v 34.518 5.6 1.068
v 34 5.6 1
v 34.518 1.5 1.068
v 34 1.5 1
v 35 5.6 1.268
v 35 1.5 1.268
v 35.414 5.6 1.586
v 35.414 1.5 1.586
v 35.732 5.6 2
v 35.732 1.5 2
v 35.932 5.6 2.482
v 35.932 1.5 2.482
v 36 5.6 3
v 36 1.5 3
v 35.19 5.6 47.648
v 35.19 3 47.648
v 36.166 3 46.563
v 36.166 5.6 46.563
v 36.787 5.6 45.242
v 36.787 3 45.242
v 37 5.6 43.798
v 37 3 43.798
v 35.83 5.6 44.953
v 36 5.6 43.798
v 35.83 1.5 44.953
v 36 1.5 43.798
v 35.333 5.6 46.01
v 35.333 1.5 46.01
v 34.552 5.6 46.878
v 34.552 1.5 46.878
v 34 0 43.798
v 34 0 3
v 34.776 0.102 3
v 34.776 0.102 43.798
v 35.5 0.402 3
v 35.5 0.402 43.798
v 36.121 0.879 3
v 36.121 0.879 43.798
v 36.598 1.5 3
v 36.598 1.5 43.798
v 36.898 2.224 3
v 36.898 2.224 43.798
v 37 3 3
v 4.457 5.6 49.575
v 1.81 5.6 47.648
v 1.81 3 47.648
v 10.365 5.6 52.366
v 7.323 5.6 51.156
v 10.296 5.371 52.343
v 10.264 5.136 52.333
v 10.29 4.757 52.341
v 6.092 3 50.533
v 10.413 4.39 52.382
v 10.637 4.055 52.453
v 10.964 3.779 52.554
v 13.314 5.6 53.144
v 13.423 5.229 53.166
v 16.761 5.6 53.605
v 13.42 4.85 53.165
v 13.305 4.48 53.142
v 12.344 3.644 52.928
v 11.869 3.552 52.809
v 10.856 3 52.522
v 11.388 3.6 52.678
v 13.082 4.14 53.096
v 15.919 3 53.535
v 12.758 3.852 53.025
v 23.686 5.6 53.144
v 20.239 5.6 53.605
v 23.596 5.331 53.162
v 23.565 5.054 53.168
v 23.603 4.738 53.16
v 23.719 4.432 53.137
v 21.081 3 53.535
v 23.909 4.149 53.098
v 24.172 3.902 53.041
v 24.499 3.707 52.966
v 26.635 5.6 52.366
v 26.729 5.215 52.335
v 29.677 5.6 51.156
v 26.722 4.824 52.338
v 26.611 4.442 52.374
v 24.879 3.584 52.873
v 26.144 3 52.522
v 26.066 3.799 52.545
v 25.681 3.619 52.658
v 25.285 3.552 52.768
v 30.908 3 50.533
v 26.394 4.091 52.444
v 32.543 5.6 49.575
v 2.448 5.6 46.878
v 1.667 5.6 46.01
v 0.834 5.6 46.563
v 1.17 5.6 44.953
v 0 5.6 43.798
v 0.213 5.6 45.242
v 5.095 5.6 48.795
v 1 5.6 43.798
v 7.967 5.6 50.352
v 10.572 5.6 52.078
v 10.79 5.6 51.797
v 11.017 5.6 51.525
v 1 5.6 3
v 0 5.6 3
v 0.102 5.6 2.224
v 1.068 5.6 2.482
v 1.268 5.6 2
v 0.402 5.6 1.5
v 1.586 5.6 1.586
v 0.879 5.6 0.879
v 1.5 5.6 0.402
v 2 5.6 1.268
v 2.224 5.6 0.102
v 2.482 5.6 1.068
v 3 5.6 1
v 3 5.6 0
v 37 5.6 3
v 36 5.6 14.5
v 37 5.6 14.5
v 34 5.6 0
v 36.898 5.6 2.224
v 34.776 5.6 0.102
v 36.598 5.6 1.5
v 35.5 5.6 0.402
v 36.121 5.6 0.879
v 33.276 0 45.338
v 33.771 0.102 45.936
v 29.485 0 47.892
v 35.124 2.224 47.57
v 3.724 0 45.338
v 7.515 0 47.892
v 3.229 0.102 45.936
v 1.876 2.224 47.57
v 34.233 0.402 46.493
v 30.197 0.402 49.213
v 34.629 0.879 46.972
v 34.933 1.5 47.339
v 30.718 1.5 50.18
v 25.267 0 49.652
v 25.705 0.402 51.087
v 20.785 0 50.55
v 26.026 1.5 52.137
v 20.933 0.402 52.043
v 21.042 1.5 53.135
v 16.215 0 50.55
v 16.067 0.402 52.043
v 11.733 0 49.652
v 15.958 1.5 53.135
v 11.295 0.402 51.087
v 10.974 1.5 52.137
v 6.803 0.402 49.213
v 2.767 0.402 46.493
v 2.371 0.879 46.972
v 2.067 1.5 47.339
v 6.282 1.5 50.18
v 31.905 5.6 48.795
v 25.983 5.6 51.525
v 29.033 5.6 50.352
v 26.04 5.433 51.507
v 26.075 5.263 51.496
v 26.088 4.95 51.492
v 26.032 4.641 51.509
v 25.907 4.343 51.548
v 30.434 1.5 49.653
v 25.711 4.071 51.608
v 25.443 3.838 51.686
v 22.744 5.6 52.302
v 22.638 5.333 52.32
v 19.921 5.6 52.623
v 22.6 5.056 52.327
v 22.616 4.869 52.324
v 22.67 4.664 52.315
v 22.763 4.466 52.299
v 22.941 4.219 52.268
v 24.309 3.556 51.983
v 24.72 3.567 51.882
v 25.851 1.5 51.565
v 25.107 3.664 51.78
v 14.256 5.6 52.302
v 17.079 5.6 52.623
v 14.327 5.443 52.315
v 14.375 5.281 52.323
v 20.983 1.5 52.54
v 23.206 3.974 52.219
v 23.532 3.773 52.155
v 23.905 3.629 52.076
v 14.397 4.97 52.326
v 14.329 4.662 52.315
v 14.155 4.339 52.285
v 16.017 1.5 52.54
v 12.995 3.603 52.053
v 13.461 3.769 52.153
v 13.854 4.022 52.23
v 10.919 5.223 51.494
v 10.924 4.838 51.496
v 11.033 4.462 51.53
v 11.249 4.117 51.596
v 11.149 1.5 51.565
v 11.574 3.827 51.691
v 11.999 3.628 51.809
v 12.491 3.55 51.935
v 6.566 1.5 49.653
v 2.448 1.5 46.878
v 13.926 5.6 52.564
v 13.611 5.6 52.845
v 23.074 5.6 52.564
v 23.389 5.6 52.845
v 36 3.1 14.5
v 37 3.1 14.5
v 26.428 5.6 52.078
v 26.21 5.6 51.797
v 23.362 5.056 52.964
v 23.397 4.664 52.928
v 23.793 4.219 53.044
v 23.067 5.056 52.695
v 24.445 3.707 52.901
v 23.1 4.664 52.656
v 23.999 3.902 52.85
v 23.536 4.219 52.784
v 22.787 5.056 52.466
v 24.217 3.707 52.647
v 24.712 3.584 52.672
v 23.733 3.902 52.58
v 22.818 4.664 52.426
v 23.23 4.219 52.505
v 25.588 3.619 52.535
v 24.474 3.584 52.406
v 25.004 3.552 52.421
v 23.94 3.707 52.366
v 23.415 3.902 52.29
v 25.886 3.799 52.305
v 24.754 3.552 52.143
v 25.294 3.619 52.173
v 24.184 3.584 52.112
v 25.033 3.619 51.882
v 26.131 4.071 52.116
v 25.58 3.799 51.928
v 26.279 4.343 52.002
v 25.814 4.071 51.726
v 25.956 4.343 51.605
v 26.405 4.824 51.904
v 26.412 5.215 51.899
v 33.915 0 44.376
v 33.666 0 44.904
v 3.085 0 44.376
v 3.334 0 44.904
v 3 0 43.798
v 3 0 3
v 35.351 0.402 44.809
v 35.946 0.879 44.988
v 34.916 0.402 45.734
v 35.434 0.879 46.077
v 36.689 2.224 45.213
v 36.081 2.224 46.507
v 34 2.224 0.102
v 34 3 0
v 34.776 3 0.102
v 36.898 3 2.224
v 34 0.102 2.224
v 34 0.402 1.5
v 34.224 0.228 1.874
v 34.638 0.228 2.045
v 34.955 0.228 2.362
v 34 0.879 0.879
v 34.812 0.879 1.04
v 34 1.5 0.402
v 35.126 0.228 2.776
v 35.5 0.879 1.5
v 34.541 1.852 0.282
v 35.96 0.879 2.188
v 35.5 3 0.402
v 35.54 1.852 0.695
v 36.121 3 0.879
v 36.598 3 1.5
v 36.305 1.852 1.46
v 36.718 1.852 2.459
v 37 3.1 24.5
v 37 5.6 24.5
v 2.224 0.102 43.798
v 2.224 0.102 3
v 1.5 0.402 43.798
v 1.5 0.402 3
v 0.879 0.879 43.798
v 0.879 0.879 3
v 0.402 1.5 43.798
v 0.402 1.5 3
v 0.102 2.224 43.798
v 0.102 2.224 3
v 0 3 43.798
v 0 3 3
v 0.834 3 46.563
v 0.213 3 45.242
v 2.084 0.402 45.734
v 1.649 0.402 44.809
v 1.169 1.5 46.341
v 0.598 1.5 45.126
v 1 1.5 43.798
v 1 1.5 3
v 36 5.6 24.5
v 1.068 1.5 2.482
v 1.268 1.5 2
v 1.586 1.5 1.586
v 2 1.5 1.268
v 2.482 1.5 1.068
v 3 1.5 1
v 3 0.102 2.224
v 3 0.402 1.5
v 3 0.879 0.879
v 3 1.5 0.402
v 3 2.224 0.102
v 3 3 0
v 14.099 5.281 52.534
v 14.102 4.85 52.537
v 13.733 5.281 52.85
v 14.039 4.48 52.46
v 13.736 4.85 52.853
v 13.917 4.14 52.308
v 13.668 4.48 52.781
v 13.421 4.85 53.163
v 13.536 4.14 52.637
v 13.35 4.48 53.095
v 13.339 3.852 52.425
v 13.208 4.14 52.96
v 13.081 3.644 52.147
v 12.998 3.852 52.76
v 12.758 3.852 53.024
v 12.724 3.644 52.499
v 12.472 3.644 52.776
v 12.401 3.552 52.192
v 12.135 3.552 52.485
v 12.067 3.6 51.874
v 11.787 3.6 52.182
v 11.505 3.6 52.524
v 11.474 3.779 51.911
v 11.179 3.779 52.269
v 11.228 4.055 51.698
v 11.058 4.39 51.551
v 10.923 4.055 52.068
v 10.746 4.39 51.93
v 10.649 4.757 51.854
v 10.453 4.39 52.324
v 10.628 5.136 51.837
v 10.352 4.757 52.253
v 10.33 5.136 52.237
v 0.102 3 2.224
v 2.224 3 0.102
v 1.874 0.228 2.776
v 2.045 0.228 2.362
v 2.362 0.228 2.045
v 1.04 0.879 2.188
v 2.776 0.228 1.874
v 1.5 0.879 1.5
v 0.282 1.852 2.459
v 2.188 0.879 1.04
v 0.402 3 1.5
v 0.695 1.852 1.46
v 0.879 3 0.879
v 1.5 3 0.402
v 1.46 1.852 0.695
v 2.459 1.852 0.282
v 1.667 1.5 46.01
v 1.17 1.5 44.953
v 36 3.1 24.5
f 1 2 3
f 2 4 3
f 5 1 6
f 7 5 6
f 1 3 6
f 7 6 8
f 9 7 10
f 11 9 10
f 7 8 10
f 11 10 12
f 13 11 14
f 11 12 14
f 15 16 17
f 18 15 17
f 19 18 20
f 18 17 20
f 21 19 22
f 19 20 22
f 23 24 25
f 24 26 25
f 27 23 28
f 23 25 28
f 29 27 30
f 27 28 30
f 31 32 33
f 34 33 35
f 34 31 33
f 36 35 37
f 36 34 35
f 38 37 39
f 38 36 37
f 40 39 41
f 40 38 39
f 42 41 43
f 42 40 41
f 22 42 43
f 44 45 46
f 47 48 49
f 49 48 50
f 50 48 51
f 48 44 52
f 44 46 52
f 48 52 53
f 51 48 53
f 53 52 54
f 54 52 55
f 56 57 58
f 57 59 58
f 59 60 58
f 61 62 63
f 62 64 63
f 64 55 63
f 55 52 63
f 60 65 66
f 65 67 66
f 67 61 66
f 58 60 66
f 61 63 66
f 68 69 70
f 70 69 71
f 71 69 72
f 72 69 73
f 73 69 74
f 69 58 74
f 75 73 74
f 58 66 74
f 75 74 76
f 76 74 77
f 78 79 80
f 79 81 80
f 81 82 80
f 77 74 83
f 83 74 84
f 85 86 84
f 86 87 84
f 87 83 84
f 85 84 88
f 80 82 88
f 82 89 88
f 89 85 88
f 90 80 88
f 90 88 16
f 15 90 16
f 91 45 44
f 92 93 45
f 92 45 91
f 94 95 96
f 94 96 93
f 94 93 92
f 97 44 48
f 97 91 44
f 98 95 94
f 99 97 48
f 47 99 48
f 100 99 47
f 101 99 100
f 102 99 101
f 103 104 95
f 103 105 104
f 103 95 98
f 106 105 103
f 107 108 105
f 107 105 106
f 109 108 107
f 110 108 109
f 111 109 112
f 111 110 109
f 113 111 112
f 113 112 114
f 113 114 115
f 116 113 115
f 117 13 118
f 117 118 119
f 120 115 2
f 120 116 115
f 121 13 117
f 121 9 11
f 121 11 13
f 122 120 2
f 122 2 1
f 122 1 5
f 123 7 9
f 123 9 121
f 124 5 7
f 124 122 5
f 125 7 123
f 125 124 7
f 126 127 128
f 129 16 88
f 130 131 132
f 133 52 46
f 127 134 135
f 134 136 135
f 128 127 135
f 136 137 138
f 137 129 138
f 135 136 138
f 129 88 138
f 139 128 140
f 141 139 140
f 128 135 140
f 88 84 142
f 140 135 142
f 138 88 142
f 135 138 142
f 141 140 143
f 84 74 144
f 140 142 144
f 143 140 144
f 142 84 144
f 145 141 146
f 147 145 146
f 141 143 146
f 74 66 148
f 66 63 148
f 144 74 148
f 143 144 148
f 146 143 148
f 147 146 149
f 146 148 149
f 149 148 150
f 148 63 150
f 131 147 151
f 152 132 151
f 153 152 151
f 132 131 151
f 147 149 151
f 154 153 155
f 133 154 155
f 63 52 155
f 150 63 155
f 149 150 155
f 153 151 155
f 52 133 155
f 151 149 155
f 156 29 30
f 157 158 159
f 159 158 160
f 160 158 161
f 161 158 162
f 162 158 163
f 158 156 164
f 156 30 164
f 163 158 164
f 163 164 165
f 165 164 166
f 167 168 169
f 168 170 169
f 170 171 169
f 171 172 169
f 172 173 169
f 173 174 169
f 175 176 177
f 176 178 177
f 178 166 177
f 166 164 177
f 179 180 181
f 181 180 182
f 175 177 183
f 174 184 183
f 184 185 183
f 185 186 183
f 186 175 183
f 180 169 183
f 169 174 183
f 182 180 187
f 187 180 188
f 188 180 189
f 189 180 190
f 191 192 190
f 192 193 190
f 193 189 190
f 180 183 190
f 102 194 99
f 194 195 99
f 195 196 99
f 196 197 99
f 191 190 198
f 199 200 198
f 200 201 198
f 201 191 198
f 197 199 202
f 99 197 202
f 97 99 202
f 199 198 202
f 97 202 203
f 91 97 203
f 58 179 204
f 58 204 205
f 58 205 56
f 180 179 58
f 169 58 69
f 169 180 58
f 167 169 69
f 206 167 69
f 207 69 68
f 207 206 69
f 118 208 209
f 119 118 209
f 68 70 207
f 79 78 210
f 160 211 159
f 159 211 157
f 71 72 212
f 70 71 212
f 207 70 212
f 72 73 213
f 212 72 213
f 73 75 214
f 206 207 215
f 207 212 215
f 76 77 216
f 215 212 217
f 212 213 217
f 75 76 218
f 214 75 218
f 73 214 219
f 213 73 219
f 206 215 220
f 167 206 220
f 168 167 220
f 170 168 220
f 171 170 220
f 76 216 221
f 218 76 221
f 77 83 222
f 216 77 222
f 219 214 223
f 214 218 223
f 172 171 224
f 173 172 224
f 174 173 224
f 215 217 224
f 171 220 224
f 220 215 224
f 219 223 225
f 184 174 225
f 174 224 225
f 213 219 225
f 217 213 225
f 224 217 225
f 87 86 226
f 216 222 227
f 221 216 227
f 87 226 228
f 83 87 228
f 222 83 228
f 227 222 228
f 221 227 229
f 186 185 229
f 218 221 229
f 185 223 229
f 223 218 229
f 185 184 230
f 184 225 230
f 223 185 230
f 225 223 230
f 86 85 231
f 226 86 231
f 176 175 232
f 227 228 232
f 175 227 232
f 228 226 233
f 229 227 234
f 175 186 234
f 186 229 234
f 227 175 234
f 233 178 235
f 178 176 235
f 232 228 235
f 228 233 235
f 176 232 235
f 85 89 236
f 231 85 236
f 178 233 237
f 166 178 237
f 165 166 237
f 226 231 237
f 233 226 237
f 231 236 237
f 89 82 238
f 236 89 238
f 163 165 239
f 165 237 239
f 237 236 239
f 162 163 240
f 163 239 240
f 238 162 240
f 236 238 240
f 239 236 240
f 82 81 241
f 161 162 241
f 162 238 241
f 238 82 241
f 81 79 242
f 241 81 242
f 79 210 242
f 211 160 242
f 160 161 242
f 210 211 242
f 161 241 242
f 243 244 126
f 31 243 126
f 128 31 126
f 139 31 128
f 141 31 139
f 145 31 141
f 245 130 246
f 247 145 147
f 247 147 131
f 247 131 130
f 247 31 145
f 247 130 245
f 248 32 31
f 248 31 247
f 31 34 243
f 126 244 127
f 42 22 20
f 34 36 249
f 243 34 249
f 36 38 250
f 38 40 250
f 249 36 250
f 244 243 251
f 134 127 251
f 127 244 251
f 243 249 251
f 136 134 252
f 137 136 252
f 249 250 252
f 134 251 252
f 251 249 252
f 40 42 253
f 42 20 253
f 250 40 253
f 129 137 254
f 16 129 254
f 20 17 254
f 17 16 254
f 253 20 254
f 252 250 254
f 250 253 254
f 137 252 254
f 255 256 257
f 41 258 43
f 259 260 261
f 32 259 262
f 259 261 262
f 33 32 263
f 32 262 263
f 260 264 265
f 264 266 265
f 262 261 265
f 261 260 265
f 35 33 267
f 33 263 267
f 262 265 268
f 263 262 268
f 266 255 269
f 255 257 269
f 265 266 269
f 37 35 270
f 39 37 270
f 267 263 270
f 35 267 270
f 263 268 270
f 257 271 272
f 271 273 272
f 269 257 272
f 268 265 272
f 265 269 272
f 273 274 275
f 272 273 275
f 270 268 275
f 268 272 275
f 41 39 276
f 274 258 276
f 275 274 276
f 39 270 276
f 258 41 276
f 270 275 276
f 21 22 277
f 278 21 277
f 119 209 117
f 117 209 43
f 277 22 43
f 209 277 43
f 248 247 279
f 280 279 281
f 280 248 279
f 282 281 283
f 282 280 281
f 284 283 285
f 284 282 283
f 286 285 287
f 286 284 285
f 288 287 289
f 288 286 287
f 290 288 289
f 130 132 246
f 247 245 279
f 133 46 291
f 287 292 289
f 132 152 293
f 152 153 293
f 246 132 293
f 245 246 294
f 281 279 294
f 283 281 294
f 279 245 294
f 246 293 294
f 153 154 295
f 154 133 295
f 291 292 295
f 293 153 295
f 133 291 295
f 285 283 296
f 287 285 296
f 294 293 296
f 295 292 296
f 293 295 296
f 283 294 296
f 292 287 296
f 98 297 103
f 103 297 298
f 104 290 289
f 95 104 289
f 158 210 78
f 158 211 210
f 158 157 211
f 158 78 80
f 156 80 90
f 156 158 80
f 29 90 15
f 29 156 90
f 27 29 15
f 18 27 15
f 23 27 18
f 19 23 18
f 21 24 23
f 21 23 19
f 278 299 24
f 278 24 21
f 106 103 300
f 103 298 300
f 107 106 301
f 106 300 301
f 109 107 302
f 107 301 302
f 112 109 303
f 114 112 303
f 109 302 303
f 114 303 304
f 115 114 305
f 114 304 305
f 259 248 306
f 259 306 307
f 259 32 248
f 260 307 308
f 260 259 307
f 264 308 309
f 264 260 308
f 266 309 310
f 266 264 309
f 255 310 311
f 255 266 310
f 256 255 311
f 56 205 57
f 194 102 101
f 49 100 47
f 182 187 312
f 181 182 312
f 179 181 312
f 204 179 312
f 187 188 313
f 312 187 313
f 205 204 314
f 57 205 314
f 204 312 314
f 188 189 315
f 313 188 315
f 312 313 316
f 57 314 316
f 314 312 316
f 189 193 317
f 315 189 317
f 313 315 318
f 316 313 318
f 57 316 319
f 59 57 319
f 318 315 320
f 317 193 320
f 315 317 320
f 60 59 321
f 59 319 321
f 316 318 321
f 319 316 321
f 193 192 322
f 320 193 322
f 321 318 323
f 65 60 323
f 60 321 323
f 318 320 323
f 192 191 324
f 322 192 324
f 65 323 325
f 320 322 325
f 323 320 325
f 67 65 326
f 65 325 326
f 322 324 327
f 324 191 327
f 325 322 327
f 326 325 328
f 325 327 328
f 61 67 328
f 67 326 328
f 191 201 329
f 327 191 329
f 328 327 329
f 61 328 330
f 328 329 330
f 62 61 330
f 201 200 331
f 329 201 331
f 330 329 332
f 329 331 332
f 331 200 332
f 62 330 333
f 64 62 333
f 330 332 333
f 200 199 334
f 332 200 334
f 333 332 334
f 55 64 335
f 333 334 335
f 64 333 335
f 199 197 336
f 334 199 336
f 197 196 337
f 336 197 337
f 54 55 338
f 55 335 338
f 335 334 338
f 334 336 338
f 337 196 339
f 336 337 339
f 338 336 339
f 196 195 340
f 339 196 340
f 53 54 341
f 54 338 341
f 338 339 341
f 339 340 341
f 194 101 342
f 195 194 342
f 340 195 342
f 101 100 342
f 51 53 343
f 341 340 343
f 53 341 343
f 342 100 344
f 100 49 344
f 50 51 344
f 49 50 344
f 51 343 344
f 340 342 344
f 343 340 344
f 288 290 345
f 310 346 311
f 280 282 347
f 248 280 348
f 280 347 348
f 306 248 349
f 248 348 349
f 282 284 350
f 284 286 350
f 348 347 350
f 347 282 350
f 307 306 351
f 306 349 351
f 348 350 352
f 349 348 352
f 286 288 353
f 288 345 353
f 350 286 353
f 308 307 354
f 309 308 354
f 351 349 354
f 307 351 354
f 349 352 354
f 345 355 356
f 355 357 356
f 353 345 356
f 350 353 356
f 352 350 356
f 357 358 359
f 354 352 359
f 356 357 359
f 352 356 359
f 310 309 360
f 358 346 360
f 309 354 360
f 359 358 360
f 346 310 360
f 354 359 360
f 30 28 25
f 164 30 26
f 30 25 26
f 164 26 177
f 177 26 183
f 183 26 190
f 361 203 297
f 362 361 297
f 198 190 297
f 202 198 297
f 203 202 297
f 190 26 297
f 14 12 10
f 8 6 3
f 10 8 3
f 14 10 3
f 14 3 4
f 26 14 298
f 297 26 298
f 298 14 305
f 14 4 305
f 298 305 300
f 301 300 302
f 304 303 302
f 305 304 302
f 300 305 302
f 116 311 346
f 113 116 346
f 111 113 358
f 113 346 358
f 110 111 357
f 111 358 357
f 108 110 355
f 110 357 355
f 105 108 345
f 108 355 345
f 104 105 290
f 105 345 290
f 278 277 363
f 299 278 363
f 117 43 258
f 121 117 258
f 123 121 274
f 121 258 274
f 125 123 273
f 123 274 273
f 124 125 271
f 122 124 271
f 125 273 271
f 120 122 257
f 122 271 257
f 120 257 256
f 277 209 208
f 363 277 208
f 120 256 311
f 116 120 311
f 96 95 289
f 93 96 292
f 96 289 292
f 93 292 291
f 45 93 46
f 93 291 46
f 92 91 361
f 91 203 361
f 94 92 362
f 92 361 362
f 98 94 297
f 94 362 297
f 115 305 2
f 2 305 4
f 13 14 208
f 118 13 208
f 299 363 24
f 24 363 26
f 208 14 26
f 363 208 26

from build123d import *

# Parameters (mm, degrees)
BOSS_EXTRUDE1_DEPTH  = 1.5
BOSS_EXTRUDE2_DEPTH  = 1.6
BOSS_EXTRUDE3_DEPTH  = 2.5
FILLET1_R            = 3
CUT_SWEEP1_PROFILE_R = 1.5


with BuildPart() as part:
    # Sketch1 → Boss-Extrude1 (new body)
    with BuildSketch(Plane(origin=(0, 0, 0), x_dir=(1, 0, 0), z_dir=(0, 1, 0))):
        with BuildLine():
            Line((0, -43.797867681), (0, -43))
            Line((0, -43), (0, -3))
            ThreePointArc((0, -3), (0.878679656, -0.878679656), (3, 0))
            Line((3, 0), (34, 0))
            ThreePointArc((34, 0), (36.121320344, -0.878679656), (37, -3))
            Line((37, -3), (37, -43))
            Line((37, -43), (37, -43.797867681))
            ThreePointArc((37, -43.797867681), (36.524802839, -45.925344888), (35.189536294, -47.648433643))
            ThreePointArc((35.189536294, -47.648433643), (18.5, -53.662950904), (1.810463706, -47.648433643))
            ThreePointArc((1.810463706, -47.648433643), (0.475197161, -45.925344888), (0, -43.797867681))
        make_face()
    extrude(amount=BOSS_EXTRUDE1_DEPTH)

    # Sketch2 → Boss-Extrude2 (add)
    with BuildSketch(Plane(origin=(0, 1.5, 0), x_dir=(1, 0, 0), z_dir=(0, 1, 0))):
        with BuildLine():
            Line((0, -43.797867681), (0, -43))
            Line((0, -43), (0, -3))
            ThreePointArc((0, -3), (0.878679656, -0.878679656), (3, 0))
            Line((3, 0), (34, 0))
            ThreePointArc((34, 0), (36.121320344, -0.878679656), (37, -3))
            Line((37, -3), (37, -43))
            Line((37, -43), (37, -43.797867681))
            ThreePointArc((37, -43.797867681), (36.524802839, -45.925344888), (35.189536294, -47.648433643))
            ThreePointArc((35.189536294, -47.648433643), (18.5, -53.662950904), (1.810463706, -47.648433643))
            ThreePointArc((1.810463706, -47.648433643), (0.475197161, -45.925344888), (0, -43.797867681))
        make_face()
        with BuildLine():
            Line((1, -43.797867681), (1, -43))
            Line((1, -43), (1, -3))
            ThreePointArc((1, -3), (1.585786438, -1.585786438), (3, -1))
            Line((3, -1), (34, -1))
            ThreePointArc((34, -1), (35.414213562, -1.585786438), (36, -3))
            Line((36, -3), (36, -43))
            Line((36, -43), (36, -43.797867681))
            ThreePointArc((36, -43.797867681), (35.619842272, -45.499849447), (34.551629035, -46.878320451))
            ThreePointArc((34.551629035, -46.878320451), (18.5, -52.662950904), (2.448370965, -46.878320451))
            ThreePointArc((2.448370965, -46.878320451), (1.380157728, -45.499849447), (1, -43.797867681))
        make_face(mode=Mode.SUBTRACT)
    extrude(amount=BOSS_EXTRUDE2_DEPTH)

    # Sketch3 → Boss-Extrude3 (add)
    with BuildSketch(Plane(origin=(0, 3.1, 0), x_dir=(1, 0, 0), z_dir=(0, 1, 0))):
        with BuildLine():
            Line((0, -43), (0, -43.797867681))
            ThreePointArc((0, -43.797867681), (0.475197161, -45.925344888), (1.810463706, -47.648433643))
            ThreePointArc((1.810463706, -47.648433643), (18.5, -53.662950904), (35.189536294, -47.648433643))
            ThreePointArc((35.189536294, -47.648433643), (36.524802839, -45.925344888), (37, -43.797867681))
            Line((37, -43.797867681), (37, -43))
            Line((37, -43), (37, -24.5))
            Line((37, -24.5), (36, -24.5))
            Line((36, -24.5), (36, -25.5))
            Line((36, -25.5), (36, -43))
            Line((36, -43), (36, -43.797867681))
            ThreePointArc((36, -43.797867681), (35.619842272, -45.499849447), (34.551629035, -46.878320451))
            ThreePointArc((34.551629035, -46.878320451), (18.5, -52.662950904), (2.448370965, -46.878320451))
            ThreePointArc((2.448370965, -46.878320451), (1.380157728, -45.499849447), (1, -43.797867681))
            Line((1, -43.797867681), (1, -43))
            Line((1, -43), (1, -3))
            ThreePointArc((1, -3), (1.585786438, -1.585786438), (3, -1))
            Line((3, -1), (34, -1))
            ThreePointArc((34, -1), (35.414213562, -1.585786438), (36, -3))
            Line((36, -3), (36, -13.5))
            Line((36, -13.5), (36, -14.5))
            Line((36, -14.5), (37, -14.5))
            Line((37, -14.5), (37, -3))
            ThreePointArc((37, -3), (36.121320344, -0.878679656), (34, 0))
            Line((34, 0), (3, 0))
            ThreePointArc((3, 0), (0.878679656, -0.878679656), (0, -3))
            Line((0, -3), (0, -43))
        make_face()
    extrude(amount=BOSS_EXTRUDE3_DEPTH)

    # Fillet1
    fillet1_edges = [part.edges().sort_by_distance(p)[0] for p in [
        (18.5, 0, 53.662950904),
        (0.475197161, 0, 45.925344888),
        (0, 0, 23.398933841),
        (0.878679656, 0, 0.878679656),
        (18.5, 0, 0),
        (36.121320344, 0, 0.878679656),
        (37, 0, 23.398933841),
        (36.524802839, 0, 45.925344888),
    ]]
    fillet(fillet1_edges, radius=FILLET1_R)

    # Cut-Sweep1: sweep along a path in Sketch4
    with BuildLine(Plane(origin=(0, 5.05, 0), x_dir=(1, 0, 0), z_dir=(0, 1, 0))) as cut_sweep1_path:
        ThreePointArc((26.454418621, -55.003798336), (18.503482621, -49.500000713), (10.548039258, -54.997281172))
    # Cut-Sweep1 profile (on start of the path) → Cut-Sweep1 (sweep, cut)
    with BuildSketch(Plane(origin=(26.454418621, 5.05, 55.003798336), x_dir=(-0.9358139553576565, 0, 0.35249431336953235), z_dir=(-0.35249431336953235, 0, -0.9358139553576565))):
        Circle(CUT_SWEEP1_PROFILE_R)
    sweep(path=cut_sweep1_path.line, mode=Mode.SUBTRACT)


solid = part.part
